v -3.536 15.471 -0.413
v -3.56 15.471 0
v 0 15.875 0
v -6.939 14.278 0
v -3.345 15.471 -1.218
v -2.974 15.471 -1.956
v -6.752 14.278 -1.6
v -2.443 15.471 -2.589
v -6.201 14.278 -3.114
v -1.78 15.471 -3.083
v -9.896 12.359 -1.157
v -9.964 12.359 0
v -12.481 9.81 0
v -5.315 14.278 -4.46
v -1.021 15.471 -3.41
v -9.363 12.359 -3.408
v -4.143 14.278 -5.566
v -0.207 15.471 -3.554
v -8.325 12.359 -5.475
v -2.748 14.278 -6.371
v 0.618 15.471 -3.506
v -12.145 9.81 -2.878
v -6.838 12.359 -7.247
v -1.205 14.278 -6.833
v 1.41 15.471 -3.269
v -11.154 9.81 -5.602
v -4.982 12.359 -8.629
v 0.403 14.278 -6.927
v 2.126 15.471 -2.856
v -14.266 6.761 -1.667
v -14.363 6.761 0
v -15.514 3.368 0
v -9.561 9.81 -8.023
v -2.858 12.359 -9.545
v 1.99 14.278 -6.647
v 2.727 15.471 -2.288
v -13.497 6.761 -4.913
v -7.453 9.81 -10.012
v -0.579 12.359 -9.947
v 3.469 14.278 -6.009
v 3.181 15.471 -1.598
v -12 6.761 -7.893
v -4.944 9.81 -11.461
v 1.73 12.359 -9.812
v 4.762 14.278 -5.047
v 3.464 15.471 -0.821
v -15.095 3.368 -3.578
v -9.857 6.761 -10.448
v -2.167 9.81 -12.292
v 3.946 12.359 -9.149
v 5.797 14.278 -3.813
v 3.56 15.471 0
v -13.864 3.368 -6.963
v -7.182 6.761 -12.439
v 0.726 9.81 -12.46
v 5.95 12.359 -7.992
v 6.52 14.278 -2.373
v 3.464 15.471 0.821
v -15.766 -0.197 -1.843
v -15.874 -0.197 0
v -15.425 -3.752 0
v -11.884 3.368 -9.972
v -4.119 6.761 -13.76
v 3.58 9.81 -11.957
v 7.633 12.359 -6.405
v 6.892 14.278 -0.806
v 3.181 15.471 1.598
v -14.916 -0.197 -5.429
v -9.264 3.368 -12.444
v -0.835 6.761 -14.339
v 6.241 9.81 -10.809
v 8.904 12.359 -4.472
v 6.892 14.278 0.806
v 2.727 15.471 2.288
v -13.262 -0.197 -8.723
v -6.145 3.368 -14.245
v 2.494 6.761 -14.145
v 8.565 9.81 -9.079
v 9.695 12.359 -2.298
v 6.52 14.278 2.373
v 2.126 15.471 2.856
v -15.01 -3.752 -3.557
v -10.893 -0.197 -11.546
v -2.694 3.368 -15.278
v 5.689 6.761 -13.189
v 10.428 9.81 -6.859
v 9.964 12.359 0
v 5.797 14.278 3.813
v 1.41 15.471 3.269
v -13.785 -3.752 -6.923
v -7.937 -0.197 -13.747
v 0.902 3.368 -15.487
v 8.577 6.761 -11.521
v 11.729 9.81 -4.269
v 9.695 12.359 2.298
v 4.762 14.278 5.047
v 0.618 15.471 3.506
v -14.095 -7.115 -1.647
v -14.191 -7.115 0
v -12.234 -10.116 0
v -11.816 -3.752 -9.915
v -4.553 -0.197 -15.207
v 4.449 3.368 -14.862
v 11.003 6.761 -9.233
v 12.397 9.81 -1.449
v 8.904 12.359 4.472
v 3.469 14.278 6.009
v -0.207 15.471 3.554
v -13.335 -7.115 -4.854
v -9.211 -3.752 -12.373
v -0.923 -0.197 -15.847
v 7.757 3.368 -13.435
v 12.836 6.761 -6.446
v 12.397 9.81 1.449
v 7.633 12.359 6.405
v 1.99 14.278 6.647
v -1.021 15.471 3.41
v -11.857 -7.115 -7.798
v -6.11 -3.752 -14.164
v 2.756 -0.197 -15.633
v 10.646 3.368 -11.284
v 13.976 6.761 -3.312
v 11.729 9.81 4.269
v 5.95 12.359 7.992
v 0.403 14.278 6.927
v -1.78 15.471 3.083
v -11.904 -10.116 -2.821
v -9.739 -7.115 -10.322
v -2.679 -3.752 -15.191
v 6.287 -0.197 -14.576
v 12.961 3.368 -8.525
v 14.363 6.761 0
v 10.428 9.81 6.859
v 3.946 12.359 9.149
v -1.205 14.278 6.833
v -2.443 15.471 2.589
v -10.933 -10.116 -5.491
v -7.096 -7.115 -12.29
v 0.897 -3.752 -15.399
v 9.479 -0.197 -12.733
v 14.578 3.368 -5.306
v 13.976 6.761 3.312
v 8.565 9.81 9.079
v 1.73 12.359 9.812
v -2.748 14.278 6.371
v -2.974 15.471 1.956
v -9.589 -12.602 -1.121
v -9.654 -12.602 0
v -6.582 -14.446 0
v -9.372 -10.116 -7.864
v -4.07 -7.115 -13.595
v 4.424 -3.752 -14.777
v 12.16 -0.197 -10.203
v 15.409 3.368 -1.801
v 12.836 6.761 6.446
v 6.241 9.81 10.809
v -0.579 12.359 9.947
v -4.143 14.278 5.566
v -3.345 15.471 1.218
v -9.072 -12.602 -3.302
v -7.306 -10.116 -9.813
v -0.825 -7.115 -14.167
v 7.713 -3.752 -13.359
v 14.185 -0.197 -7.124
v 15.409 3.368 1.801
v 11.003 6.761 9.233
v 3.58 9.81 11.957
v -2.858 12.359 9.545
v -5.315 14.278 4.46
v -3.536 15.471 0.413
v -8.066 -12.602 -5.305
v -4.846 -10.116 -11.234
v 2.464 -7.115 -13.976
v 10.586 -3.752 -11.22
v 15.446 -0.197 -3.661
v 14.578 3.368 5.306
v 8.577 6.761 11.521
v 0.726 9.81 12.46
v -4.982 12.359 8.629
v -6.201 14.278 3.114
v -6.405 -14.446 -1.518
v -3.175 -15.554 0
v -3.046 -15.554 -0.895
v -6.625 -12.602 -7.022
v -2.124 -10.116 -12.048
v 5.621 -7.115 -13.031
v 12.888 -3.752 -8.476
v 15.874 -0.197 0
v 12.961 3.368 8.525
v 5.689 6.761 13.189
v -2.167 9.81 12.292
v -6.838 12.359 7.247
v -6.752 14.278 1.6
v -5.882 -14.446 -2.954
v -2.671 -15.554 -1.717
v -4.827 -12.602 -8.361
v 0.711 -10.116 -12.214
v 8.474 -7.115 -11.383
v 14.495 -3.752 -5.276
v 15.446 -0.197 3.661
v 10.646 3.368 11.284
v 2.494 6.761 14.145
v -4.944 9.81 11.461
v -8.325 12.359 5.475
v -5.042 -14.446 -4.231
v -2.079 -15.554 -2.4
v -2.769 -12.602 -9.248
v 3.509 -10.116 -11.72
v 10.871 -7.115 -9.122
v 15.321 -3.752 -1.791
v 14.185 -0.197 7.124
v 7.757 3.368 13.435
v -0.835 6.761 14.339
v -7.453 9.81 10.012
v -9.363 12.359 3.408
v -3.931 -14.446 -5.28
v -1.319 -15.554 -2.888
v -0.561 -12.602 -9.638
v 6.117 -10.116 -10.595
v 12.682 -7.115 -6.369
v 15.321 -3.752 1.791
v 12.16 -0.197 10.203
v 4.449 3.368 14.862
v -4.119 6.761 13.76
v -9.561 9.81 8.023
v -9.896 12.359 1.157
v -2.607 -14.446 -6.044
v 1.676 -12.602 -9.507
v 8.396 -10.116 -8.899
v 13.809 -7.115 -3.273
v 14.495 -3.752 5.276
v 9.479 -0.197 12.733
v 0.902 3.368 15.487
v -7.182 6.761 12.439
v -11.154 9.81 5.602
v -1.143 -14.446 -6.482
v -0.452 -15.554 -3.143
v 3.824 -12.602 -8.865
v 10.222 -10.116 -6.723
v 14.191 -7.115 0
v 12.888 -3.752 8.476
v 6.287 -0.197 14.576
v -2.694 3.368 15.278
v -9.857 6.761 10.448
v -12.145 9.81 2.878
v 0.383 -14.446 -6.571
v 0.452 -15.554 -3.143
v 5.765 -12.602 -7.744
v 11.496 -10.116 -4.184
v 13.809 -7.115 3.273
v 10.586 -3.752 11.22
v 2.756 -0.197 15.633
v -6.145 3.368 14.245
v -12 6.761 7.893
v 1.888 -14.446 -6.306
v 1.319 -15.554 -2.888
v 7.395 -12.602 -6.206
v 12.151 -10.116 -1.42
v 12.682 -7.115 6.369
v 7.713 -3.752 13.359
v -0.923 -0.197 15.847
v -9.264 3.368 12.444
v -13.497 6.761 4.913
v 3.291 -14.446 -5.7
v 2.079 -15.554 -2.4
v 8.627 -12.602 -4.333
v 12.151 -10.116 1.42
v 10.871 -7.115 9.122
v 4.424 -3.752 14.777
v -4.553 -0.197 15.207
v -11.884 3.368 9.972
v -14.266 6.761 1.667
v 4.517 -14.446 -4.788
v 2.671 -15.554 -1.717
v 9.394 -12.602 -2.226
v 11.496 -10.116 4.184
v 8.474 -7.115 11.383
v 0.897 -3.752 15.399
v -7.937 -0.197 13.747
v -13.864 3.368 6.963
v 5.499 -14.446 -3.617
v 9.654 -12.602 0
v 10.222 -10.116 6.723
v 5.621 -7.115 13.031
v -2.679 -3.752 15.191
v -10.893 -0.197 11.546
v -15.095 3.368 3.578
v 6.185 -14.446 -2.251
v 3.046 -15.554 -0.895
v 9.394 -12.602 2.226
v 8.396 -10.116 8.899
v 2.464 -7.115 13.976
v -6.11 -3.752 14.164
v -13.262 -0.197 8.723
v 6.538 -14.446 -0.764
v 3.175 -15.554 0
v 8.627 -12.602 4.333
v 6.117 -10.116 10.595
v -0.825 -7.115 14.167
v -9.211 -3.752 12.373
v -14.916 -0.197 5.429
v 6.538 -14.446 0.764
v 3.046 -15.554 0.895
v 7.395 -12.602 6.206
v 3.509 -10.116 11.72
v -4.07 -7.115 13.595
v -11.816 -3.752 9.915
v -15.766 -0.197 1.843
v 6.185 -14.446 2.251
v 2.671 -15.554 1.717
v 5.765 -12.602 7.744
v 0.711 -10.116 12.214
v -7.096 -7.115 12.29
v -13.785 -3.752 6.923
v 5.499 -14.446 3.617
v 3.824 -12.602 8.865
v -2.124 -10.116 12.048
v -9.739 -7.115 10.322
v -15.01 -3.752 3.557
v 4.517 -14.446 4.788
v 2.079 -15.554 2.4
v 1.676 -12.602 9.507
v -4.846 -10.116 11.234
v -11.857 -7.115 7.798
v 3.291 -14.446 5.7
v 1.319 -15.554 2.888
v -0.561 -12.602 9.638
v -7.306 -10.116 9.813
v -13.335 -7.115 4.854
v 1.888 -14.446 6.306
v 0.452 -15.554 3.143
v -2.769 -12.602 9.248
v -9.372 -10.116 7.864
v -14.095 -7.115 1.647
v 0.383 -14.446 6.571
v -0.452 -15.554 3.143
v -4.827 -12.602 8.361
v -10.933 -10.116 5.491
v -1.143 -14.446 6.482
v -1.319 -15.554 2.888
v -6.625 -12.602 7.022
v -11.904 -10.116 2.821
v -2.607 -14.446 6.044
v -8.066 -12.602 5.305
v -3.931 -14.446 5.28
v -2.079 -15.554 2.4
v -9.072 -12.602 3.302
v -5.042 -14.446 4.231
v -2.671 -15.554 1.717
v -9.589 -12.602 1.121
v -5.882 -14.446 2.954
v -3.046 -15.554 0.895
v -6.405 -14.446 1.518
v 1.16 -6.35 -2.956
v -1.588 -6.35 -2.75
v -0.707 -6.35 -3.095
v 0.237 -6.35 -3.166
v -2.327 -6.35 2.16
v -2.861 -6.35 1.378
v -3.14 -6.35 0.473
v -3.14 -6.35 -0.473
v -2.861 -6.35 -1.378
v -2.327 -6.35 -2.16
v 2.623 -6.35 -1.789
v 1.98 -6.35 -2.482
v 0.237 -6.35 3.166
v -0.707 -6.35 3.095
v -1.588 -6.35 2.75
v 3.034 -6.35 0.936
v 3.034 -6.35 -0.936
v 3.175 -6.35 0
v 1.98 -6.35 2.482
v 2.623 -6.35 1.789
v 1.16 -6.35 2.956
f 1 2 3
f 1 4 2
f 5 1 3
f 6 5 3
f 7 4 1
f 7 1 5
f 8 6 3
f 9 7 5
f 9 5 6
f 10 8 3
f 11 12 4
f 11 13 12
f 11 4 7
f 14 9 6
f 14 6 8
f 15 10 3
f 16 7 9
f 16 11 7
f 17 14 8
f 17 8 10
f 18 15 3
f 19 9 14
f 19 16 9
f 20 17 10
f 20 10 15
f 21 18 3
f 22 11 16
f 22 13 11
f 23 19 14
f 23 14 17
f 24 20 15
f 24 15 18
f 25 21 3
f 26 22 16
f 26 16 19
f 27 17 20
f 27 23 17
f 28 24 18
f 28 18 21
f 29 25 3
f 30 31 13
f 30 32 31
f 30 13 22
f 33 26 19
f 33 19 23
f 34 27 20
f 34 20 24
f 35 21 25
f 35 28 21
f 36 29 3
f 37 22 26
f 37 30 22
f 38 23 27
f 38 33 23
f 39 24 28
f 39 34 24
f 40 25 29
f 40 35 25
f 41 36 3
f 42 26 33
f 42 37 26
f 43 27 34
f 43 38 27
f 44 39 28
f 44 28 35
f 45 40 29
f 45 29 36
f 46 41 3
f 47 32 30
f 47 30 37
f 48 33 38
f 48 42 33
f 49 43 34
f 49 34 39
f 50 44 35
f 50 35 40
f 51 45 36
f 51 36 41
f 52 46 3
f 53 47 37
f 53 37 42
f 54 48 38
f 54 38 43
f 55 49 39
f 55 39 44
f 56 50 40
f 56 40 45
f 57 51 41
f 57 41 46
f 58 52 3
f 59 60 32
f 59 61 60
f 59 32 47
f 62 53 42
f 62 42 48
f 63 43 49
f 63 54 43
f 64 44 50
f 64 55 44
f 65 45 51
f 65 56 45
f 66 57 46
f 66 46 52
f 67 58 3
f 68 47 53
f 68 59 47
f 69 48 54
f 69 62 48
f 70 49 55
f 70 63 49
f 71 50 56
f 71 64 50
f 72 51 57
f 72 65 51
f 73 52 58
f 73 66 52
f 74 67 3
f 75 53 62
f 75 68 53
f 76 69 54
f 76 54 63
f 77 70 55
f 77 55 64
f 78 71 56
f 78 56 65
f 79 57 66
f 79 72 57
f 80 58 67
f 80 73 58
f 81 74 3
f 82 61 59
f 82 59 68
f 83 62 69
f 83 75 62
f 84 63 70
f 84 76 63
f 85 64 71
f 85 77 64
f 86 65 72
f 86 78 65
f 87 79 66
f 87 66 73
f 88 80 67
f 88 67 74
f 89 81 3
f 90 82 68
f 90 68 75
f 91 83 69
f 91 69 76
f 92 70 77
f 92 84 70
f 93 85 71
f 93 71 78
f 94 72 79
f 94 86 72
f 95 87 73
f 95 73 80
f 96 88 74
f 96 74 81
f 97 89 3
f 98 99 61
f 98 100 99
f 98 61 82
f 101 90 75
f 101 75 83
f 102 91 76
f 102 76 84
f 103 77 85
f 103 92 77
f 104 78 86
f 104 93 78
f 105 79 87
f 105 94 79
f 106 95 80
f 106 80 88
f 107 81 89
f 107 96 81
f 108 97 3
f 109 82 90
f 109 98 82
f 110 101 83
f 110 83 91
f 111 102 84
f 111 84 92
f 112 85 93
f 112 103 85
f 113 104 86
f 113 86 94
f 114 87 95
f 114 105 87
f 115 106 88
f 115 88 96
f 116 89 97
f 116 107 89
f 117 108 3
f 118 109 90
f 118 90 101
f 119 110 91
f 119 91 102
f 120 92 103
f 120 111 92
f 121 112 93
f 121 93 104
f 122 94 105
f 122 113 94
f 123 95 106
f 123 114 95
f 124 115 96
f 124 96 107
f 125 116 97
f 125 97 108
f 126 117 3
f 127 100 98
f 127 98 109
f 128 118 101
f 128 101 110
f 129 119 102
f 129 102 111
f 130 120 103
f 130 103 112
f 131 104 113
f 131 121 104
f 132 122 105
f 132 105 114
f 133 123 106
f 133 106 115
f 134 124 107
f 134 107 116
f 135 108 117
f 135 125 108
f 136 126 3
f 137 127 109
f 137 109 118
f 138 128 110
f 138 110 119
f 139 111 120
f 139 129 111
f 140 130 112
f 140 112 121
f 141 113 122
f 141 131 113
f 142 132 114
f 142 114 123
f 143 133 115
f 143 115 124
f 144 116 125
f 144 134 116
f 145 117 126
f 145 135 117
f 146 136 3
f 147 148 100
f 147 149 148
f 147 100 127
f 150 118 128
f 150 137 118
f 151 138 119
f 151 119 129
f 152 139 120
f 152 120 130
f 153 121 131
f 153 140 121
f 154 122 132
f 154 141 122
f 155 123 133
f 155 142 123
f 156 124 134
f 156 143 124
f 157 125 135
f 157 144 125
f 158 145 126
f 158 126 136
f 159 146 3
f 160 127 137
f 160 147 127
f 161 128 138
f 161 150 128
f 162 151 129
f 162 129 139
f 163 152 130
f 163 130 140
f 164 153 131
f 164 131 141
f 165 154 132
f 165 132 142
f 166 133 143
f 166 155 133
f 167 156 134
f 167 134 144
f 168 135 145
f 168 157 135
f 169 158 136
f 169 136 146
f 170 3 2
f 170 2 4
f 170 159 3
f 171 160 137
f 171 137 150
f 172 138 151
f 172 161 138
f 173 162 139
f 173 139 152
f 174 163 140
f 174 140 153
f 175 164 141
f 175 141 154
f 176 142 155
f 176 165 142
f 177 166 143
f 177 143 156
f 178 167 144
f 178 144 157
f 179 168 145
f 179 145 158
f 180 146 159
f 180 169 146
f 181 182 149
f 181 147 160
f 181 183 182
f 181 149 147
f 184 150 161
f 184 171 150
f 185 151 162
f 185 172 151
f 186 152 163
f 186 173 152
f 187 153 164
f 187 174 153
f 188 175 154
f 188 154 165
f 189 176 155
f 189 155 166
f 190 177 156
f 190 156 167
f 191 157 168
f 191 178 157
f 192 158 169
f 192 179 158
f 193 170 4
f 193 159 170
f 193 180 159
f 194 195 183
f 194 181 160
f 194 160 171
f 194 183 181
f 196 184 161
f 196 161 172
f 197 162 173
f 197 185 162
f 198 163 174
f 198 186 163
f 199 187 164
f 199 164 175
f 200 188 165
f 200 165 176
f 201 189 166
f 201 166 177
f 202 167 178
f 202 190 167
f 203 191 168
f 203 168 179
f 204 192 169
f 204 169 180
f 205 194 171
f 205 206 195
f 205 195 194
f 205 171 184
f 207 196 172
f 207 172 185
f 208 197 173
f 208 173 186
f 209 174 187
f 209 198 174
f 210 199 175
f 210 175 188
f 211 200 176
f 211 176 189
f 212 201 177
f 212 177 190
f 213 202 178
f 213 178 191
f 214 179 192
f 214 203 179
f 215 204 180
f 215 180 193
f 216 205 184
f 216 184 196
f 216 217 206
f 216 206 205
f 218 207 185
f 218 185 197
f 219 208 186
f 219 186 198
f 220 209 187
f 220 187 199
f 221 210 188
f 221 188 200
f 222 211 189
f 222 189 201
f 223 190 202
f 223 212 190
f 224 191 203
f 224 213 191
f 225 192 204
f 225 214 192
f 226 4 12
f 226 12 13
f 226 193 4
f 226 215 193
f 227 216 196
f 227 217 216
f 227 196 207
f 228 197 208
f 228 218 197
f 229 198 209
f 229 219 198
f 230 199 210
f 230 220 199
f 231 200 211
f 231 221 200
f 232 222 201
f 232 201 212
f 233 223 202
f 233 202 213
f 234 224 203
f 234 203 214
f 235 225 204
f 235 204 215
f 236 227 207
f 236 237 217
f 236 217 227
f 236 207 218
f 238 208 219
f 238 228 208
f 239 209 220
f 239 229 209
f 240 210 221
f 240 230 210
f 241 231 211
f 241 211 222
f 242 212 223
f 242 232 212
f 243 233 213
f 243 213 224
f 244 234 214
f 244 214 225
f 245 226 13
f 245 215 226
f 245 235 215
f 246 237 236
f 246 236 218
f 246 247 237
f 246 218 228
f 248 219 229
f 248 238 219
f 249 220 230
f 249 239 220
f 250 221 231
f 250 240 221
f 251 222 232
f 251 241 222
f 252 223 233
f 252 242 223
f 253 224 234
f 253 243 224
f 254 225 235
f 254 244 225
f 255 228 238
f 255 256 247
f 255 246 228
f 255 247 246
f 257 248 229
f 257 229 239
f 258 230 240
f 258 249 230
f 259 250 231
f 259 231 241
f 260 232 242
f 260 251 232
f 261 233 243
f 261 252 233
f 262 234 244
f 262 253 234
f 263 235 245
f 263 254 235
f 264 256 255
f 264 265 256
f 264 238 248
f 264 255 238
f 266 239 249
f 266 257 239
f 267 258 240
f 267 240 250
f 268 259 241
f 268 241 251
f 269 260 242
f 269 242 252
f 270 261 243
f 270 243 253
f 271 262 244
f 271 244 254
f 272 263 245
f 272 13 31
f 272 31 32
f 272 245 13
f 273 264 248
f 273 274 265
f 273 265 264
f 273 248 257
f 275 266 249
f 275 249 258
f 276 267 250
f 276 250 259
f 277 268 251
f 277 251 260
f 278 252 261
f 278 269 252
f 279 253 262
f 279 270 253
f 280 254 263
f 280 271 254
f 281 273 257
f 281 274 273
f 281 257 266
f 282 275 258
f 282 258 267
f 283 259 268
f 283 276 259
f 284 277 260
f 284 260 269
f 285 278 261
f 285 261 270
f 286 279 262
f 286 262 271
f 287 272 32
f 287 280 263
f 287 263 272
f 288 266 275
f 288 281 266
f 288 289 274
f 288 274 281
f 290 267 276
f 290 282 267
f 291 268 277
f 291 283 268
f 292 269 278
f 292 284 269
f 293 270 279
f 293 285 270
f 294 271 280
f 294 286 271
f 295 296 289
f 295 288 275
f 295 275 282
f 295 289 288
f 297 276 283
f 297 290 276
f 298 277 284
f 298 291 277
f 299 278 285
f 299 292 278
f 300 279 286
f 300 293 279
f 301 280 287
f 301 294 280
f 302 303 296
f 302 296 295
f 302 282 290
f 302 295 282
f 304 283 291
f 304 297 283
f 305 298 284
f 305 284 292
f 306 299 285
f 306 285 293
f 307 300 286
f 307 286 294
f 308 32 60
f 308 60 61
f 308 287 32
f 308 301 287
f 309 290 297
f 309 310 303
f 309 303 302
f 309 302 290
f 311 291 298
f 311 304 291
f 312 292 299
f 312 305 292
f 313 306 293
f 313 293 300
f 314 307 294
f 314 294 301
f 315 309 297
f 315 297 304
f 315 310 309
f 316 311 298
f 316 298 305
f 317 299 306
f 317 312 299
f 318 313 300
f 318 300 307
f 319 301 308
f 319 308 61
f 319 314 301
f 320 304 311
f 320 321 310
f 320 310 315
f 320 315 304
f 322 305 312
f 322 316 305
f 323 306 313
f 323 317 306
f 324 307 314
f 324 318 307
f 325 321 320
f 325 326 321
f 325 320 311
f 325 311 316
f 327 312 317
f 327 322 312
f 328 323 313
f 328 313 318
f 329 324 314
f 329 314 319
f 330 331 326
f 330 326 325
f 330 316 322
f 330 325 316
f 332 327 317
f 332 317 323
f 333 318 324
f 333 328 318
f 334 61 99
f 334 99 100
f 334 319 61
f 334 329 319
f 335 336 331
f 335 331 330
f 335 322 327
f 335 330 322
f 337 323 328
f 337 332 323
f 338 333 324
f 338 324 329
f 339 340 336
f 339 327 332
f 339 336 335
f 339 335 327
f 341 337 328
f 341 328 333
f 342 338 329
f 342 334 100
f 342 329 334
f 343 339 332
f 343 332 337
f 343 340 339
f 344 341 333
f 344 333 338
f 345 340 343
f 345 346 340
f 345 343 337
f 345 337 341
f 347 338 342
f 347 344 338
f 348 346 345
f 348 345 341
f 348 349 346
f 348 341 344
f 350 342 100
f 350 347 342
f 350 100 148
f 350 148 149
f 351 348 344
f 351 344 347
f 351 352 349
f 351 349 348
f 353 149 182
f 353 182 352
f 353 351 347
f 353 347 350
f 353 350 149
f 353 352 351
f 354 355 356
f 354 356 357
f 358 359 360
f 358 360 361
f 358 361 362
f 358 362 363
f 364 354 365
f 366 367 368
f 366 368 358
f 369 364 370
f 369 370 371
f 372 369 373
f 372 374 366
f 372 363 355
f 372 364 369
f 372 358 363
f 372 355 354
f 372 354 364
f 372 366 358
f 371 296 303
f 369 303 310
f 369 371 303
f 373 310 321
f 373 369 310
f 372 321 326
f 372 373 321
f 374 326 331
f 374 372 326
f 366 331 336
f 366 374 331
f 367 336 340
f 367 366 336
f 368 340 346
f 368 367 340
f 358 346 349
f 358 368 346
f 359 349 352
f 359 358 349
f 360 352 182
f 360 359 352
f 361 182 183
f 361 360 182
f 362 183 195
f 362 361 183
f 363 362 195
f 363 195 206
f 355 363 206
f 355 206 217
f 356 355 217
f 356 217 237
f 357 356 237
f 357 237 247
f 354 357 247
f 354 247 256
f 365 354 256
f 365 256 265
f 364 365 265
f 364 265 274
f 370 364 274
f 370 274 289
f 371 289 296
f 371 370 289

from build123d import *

# Parameters (mm, degrees)
F4_R     = 3.175
F5_DEPTH = 25.4


with BuildPart() as f2:
    # F1 (on Top) → F2 (revolve)
    with BuildSketch(Plane.XY):
        with BuildLine():
            Line((0, -15.875), (0, 15.875))
            ThreePointArc((0, 15.875), (-15.875, 0), (0, -15.875))
        make_face()
    revolve(axis=Axis((0, 0, 0), (0, -1, 0)))


with BuildPart() as f5:
    # F4 (on offset) → F5 (new body)
    with BuildSketch(Plane.XZ.offset(6.35)):
        Circle(F4_R)
    extrude(amount=F5_DEPTH)


with BuildPart() as f2_1:
    add(f2.part)

    # F6: cut F5
    add(f5.part, mode=Mode.SUBTRACT)


solid = f2_1.part
